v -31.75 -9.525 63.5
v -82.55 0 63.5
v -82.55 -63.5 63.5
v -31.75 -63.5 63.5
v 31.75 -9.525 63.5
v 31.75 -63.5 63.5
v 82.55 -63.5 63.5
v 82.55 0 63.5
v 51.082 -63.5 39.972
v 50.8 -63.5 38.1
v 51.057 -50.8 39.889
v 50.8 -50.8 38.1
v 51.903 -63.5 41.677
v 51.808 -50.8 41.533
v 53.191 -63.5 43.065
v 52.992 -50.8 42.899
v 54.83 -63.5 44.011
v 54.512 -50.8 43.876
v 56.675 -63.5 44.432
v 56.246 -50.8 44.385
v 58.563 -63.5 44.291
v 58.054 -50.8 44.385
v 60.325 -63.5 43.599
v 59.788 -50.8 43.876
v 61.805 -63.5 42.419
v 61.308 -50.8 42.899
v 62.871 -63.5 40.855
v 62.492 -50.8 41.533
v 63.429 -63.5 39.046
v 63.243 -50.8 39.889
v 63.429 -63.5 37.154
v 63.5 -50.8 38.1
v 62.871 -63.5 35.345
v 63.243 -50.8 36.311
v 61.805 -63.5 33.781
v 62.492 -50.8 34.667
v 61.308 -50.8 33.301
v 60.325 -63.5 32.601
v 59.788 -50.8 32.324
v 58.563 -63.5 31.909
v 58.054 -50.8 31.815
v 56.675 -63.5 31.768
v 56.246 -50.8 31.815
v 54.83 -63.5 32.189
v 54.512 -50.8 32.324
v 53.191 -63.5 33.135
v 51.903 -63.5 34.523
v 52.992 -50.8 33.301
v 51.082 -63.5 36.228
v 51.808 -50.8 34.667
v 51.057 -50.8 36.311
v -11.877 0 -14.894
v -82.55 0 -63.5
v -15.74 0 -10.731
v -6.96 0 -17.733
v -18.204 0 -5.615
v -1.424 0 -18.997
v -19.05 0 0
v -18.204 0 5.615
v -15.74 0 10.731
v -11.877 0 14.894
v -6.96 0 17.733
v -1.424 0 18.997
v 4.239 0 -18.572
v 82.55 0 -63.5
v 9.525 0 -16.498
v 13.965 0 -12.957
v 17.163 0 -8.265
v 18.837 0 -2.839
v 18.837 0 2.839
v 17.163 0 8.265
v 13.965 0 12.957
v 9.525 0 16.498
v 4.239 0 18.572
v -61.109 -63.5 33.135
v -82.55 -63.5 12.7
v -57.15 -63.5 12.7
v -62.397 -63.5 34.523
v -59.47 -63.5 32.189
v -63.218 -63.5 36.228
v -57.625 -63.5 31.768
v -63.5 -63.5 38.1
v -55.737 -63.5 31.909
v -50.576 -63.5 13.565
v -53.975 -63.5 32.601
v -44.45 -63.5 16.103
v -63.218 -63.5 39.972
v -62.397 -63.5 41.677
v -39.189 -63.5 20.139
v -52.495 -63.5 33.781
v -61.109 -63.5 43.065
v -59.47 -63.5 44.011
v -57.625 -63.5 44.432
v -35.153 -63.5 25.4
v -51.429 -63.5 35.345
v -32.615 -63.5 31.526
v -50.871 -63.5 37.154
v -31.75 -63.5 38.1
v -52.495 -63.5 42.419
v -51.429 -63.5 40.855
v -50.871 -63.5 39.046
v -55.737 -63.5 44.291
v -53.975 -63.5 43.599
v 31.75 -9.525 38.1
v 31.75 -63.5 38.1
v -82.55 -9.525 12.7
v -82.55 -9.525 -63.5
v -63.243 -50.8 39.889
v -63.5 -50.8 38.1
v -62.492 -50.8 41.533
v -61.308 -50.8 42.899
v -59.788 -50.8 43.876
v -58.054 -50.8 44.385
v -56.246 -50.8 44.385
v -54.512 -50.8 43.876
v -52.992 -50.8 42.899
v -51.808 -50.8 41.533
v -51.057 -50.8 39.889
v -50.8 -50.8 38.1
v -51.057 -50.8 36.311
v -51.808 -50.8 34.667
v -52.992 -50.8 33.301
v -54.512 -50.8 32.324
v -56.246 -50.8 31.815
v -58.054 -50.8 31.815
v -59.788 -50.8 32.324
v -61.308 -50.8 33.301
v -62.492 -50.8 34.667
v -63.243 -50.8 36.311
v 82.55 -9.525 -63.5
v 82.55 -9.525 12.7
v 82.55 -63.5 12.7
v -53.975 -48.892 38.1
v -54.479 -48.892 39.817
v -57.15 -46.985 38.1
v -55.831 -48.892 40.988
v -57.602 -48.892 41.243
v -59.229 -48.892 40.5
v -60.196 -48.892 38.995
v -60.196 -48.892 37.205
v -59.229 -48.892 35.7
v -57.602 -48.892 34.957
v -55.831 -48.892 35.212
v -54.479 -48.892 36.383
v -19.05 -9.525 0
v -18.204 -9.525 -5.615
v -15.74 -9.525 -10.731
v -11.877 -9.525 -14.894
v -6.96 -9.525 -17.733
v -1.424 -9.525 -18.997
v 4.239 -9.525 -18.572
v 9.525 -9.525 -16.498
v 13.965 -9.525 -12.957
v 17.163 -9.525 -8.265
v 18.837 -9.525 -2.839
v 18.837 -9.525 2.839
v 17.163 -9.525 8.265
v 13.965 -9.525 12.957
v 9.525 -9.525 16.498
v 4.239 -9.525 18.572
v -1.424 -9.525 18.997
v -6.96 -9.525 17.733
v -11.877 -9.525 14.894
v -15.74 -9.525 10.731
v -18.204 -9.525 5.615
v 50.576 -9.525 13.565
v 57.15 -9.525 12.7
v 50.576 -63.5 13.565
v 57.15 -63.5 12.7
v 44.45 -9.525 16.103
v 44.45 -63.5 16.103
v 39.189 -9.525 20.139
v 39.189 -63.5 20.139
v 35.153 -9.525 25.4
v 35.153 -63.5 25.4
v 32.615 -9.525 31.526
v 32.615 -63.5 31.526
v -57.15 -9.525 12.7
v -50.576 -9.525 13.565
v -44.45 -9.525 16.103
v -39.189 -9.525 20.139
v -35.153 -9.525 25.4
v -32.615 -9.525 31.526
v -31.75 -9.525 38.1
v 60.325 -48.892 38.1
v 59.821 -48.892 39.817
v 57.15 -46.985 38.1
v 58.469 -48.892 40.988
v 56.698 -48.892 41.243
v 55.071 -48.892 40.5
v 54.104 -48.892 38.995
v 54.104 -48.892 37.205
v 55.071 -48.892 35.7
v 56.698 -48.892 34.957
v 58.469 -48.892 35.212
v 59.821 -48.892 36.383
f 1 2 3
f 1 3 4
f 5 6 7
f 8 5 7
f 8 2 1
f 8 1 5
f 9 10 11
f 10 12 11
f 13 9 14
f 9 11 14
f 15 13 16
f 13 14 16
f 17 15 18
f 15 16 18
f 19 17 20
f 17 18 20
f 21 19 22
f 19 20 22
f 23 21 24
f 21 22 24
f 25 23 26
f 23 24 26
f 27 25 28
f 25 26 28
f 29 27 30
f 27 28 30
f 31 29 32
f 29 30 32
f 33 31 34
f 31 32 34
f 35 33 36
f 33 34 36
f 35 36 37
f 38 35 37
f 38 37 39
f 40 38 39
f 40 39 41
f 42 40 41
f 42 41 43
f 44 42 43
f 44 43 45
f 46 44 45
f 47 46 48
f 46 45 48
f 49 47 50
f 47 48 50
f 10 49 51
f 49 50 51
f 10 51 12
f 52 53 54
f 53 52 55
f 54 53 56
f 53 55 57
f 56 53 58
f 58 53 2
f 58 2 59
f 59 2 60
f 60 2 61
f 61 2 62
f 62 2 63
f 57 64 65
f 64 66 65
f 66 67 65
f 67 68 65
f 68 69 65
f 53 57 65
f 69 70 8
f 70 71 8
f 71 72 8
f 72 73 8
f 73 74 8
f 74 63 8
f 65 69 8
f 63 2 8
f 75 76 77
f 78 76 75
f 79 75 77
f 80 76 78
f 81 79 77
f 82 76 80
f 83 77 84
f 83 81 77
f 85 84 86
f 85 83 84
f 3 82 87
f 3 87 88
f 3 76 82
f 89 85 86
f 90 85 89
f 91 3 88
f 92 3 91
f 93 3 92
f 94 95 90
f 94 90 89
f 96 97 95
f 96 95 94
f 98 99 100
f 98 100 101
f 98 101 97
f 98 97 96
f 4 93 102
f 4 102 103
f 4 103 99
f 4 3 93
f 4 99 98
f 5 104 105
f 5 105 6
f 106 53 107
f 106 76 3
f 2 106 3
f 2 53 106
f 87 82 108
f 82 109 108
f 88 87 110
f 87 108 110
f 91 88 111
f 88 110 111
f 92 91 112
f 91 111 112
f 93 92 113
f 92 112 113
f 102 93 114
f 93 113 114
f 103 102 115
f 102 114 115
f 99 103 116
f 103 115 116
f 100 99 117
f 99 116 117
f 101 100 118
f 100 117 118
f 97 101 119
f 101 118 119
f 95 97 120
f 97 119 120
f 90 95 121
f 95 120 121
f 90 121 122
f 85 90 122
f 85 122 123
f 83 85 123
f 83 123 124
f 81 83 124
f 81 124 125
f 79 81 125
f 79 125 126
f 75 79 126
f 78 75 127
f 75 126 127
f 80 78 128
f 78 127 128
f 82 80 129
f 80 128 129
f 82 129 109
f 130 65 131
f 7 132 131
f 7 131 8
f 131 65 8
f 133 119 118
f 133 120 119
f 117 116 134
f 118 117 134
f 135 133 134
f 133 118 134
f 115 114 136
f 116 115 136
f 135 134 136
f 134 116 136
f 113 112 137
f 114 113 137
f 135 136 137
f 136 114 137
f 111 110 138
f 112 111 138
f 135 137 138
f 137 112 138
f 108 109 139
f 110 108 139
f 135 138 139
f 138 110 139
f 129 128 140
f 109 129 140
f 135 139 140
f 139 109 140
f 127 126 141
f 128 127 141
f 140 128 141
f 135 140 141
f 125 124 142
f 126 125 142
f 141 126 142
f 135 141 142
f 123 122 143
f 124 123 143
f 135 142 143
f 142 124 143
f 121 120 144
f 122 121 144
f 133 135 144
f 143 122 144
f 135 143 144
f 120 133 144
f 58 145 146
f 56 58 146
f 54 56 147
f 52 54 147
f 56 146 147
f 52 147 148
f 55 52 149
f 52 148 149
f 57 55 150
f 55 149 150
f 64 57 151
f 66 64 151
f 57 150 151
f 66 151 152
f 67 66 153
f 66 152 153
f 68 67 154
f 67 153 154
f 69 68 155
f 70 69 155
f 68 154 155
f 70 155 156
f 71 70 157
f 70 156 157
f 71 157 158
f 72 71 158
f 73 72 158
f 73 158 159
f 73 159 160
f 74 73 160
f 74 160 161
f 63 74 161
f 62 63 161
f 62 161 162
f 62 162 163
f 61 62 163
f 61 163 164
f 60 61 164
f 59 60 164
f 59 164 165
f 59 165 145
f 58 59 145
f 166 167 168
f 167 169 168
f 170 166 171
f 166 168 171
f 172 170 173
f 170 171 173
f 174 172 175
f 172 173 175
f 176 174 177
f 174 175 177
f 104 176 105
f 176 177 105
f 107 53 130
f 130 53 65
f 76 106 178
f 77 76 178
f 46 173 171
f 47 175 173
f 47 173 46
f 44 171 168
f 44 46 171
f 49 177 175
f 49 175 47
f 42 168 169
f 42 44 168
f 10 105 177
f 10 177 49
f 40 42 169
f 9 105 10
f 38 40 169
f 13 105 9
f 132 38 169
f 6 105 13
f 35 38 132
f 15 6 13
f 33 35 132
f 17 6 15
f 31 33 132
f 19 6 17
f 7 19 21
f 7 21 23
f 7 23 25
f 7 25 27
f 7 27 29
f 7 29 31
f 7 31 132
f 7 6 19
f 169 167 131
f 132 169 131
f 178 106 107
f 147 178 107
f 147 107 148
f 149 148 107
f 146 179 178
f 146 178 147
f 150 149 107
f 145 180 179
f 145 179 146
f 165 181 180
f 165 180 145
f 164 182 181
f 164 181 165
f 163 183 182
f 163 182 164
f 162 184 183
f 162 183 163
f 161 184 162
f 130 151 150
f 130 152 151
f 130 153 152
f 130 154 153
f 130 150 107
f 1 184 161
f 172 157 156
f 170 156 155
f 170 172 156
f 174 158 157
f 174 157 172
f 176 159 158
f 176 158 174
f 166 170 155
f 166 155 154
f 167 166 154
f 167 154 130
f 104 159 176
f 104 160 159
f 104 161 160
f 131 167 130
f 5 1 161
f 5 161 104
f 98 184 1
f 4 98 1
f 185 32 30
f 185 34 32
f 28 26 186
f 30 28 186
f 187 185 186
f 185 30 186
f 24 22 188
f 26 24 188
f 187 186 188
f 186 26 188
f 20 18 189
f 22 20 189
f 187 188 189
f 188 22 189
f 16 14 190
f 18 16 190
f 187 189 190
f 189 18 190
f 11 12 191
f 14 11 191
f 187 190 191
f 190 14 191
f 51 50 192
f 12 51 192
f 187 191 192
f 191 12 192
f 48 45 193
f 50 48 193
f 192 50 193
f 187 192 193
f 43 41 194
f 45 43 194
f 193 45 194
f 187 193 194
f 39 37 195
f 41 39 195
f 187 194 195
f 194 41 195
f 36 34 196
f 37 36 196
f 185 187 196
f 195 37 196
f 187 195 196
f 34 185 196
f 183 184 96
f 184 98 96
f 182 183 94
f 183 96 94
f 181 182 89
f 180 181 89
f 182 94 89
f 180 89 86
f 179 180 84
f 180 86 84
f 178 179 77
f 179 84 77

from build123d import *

# Parameters (mm, degrees)
F0_W     = 165.1
F0_H     = 127
F2_DEPTH = 9.525
F3_D     = 38.1
F4_W     = 50.8
F4_H     = 50.8
F5_DEPTH = 63.5
F6_R     = 25.4
F8_D     = 12.7
F8_DEPTH = 12.7
F8_TIP   = 3.8154649308


with BuildPart() as f2:
    # F0 (on Front) → F2 (new body)
    with BuildSketch(Plane.XZ):
        Rectangle(F0_W, F0_H)
    extrude(amount=F2_DEPTH)

    # F3 (through all)
    with Locations(Plane(origin=(0, 0, 0), x_dir=(1, 0, 0), z_dir=(0, 1, 0))):
        with Locations((0, 0)):
            Hole(F3_D / 2)

    # F4 (on Front) → F5 (join)
    with BuildSketch(Plane.XZ):
        with Locations((-57.15, 38.1)):
            Rectangle(F4_W, F4_H)
        with Locations((57.15, 38.1)):
            Rectangle(F4_W, F4_H)
    extrude(amount=F5_DEPTH)

    # F6
    f6_edges = [f2.edges().sort_by_distance(p)[0] for p in [
        (-31.75, -36.5125, 12.7),
        (31.75, -36.5125, 12.7),
    ]]
    fillet(f6_edges, radius=F6_R)

    # F8
    with Locations(Plane.XZ.offset(63.5)):
        with Locations((-57.15, 38.1), (57.15, 38.1)):
            Hole(F8_D / 2, depth=F8_DEPTH)
            with Locations((0, 0, -(F8_DEPTH + F8_TIP / 2))):  # 118° drill point
                Cone(0, F8_D / 2, F8_TIP, mode=Mode.SUBTRACT)


solid = f2.part
